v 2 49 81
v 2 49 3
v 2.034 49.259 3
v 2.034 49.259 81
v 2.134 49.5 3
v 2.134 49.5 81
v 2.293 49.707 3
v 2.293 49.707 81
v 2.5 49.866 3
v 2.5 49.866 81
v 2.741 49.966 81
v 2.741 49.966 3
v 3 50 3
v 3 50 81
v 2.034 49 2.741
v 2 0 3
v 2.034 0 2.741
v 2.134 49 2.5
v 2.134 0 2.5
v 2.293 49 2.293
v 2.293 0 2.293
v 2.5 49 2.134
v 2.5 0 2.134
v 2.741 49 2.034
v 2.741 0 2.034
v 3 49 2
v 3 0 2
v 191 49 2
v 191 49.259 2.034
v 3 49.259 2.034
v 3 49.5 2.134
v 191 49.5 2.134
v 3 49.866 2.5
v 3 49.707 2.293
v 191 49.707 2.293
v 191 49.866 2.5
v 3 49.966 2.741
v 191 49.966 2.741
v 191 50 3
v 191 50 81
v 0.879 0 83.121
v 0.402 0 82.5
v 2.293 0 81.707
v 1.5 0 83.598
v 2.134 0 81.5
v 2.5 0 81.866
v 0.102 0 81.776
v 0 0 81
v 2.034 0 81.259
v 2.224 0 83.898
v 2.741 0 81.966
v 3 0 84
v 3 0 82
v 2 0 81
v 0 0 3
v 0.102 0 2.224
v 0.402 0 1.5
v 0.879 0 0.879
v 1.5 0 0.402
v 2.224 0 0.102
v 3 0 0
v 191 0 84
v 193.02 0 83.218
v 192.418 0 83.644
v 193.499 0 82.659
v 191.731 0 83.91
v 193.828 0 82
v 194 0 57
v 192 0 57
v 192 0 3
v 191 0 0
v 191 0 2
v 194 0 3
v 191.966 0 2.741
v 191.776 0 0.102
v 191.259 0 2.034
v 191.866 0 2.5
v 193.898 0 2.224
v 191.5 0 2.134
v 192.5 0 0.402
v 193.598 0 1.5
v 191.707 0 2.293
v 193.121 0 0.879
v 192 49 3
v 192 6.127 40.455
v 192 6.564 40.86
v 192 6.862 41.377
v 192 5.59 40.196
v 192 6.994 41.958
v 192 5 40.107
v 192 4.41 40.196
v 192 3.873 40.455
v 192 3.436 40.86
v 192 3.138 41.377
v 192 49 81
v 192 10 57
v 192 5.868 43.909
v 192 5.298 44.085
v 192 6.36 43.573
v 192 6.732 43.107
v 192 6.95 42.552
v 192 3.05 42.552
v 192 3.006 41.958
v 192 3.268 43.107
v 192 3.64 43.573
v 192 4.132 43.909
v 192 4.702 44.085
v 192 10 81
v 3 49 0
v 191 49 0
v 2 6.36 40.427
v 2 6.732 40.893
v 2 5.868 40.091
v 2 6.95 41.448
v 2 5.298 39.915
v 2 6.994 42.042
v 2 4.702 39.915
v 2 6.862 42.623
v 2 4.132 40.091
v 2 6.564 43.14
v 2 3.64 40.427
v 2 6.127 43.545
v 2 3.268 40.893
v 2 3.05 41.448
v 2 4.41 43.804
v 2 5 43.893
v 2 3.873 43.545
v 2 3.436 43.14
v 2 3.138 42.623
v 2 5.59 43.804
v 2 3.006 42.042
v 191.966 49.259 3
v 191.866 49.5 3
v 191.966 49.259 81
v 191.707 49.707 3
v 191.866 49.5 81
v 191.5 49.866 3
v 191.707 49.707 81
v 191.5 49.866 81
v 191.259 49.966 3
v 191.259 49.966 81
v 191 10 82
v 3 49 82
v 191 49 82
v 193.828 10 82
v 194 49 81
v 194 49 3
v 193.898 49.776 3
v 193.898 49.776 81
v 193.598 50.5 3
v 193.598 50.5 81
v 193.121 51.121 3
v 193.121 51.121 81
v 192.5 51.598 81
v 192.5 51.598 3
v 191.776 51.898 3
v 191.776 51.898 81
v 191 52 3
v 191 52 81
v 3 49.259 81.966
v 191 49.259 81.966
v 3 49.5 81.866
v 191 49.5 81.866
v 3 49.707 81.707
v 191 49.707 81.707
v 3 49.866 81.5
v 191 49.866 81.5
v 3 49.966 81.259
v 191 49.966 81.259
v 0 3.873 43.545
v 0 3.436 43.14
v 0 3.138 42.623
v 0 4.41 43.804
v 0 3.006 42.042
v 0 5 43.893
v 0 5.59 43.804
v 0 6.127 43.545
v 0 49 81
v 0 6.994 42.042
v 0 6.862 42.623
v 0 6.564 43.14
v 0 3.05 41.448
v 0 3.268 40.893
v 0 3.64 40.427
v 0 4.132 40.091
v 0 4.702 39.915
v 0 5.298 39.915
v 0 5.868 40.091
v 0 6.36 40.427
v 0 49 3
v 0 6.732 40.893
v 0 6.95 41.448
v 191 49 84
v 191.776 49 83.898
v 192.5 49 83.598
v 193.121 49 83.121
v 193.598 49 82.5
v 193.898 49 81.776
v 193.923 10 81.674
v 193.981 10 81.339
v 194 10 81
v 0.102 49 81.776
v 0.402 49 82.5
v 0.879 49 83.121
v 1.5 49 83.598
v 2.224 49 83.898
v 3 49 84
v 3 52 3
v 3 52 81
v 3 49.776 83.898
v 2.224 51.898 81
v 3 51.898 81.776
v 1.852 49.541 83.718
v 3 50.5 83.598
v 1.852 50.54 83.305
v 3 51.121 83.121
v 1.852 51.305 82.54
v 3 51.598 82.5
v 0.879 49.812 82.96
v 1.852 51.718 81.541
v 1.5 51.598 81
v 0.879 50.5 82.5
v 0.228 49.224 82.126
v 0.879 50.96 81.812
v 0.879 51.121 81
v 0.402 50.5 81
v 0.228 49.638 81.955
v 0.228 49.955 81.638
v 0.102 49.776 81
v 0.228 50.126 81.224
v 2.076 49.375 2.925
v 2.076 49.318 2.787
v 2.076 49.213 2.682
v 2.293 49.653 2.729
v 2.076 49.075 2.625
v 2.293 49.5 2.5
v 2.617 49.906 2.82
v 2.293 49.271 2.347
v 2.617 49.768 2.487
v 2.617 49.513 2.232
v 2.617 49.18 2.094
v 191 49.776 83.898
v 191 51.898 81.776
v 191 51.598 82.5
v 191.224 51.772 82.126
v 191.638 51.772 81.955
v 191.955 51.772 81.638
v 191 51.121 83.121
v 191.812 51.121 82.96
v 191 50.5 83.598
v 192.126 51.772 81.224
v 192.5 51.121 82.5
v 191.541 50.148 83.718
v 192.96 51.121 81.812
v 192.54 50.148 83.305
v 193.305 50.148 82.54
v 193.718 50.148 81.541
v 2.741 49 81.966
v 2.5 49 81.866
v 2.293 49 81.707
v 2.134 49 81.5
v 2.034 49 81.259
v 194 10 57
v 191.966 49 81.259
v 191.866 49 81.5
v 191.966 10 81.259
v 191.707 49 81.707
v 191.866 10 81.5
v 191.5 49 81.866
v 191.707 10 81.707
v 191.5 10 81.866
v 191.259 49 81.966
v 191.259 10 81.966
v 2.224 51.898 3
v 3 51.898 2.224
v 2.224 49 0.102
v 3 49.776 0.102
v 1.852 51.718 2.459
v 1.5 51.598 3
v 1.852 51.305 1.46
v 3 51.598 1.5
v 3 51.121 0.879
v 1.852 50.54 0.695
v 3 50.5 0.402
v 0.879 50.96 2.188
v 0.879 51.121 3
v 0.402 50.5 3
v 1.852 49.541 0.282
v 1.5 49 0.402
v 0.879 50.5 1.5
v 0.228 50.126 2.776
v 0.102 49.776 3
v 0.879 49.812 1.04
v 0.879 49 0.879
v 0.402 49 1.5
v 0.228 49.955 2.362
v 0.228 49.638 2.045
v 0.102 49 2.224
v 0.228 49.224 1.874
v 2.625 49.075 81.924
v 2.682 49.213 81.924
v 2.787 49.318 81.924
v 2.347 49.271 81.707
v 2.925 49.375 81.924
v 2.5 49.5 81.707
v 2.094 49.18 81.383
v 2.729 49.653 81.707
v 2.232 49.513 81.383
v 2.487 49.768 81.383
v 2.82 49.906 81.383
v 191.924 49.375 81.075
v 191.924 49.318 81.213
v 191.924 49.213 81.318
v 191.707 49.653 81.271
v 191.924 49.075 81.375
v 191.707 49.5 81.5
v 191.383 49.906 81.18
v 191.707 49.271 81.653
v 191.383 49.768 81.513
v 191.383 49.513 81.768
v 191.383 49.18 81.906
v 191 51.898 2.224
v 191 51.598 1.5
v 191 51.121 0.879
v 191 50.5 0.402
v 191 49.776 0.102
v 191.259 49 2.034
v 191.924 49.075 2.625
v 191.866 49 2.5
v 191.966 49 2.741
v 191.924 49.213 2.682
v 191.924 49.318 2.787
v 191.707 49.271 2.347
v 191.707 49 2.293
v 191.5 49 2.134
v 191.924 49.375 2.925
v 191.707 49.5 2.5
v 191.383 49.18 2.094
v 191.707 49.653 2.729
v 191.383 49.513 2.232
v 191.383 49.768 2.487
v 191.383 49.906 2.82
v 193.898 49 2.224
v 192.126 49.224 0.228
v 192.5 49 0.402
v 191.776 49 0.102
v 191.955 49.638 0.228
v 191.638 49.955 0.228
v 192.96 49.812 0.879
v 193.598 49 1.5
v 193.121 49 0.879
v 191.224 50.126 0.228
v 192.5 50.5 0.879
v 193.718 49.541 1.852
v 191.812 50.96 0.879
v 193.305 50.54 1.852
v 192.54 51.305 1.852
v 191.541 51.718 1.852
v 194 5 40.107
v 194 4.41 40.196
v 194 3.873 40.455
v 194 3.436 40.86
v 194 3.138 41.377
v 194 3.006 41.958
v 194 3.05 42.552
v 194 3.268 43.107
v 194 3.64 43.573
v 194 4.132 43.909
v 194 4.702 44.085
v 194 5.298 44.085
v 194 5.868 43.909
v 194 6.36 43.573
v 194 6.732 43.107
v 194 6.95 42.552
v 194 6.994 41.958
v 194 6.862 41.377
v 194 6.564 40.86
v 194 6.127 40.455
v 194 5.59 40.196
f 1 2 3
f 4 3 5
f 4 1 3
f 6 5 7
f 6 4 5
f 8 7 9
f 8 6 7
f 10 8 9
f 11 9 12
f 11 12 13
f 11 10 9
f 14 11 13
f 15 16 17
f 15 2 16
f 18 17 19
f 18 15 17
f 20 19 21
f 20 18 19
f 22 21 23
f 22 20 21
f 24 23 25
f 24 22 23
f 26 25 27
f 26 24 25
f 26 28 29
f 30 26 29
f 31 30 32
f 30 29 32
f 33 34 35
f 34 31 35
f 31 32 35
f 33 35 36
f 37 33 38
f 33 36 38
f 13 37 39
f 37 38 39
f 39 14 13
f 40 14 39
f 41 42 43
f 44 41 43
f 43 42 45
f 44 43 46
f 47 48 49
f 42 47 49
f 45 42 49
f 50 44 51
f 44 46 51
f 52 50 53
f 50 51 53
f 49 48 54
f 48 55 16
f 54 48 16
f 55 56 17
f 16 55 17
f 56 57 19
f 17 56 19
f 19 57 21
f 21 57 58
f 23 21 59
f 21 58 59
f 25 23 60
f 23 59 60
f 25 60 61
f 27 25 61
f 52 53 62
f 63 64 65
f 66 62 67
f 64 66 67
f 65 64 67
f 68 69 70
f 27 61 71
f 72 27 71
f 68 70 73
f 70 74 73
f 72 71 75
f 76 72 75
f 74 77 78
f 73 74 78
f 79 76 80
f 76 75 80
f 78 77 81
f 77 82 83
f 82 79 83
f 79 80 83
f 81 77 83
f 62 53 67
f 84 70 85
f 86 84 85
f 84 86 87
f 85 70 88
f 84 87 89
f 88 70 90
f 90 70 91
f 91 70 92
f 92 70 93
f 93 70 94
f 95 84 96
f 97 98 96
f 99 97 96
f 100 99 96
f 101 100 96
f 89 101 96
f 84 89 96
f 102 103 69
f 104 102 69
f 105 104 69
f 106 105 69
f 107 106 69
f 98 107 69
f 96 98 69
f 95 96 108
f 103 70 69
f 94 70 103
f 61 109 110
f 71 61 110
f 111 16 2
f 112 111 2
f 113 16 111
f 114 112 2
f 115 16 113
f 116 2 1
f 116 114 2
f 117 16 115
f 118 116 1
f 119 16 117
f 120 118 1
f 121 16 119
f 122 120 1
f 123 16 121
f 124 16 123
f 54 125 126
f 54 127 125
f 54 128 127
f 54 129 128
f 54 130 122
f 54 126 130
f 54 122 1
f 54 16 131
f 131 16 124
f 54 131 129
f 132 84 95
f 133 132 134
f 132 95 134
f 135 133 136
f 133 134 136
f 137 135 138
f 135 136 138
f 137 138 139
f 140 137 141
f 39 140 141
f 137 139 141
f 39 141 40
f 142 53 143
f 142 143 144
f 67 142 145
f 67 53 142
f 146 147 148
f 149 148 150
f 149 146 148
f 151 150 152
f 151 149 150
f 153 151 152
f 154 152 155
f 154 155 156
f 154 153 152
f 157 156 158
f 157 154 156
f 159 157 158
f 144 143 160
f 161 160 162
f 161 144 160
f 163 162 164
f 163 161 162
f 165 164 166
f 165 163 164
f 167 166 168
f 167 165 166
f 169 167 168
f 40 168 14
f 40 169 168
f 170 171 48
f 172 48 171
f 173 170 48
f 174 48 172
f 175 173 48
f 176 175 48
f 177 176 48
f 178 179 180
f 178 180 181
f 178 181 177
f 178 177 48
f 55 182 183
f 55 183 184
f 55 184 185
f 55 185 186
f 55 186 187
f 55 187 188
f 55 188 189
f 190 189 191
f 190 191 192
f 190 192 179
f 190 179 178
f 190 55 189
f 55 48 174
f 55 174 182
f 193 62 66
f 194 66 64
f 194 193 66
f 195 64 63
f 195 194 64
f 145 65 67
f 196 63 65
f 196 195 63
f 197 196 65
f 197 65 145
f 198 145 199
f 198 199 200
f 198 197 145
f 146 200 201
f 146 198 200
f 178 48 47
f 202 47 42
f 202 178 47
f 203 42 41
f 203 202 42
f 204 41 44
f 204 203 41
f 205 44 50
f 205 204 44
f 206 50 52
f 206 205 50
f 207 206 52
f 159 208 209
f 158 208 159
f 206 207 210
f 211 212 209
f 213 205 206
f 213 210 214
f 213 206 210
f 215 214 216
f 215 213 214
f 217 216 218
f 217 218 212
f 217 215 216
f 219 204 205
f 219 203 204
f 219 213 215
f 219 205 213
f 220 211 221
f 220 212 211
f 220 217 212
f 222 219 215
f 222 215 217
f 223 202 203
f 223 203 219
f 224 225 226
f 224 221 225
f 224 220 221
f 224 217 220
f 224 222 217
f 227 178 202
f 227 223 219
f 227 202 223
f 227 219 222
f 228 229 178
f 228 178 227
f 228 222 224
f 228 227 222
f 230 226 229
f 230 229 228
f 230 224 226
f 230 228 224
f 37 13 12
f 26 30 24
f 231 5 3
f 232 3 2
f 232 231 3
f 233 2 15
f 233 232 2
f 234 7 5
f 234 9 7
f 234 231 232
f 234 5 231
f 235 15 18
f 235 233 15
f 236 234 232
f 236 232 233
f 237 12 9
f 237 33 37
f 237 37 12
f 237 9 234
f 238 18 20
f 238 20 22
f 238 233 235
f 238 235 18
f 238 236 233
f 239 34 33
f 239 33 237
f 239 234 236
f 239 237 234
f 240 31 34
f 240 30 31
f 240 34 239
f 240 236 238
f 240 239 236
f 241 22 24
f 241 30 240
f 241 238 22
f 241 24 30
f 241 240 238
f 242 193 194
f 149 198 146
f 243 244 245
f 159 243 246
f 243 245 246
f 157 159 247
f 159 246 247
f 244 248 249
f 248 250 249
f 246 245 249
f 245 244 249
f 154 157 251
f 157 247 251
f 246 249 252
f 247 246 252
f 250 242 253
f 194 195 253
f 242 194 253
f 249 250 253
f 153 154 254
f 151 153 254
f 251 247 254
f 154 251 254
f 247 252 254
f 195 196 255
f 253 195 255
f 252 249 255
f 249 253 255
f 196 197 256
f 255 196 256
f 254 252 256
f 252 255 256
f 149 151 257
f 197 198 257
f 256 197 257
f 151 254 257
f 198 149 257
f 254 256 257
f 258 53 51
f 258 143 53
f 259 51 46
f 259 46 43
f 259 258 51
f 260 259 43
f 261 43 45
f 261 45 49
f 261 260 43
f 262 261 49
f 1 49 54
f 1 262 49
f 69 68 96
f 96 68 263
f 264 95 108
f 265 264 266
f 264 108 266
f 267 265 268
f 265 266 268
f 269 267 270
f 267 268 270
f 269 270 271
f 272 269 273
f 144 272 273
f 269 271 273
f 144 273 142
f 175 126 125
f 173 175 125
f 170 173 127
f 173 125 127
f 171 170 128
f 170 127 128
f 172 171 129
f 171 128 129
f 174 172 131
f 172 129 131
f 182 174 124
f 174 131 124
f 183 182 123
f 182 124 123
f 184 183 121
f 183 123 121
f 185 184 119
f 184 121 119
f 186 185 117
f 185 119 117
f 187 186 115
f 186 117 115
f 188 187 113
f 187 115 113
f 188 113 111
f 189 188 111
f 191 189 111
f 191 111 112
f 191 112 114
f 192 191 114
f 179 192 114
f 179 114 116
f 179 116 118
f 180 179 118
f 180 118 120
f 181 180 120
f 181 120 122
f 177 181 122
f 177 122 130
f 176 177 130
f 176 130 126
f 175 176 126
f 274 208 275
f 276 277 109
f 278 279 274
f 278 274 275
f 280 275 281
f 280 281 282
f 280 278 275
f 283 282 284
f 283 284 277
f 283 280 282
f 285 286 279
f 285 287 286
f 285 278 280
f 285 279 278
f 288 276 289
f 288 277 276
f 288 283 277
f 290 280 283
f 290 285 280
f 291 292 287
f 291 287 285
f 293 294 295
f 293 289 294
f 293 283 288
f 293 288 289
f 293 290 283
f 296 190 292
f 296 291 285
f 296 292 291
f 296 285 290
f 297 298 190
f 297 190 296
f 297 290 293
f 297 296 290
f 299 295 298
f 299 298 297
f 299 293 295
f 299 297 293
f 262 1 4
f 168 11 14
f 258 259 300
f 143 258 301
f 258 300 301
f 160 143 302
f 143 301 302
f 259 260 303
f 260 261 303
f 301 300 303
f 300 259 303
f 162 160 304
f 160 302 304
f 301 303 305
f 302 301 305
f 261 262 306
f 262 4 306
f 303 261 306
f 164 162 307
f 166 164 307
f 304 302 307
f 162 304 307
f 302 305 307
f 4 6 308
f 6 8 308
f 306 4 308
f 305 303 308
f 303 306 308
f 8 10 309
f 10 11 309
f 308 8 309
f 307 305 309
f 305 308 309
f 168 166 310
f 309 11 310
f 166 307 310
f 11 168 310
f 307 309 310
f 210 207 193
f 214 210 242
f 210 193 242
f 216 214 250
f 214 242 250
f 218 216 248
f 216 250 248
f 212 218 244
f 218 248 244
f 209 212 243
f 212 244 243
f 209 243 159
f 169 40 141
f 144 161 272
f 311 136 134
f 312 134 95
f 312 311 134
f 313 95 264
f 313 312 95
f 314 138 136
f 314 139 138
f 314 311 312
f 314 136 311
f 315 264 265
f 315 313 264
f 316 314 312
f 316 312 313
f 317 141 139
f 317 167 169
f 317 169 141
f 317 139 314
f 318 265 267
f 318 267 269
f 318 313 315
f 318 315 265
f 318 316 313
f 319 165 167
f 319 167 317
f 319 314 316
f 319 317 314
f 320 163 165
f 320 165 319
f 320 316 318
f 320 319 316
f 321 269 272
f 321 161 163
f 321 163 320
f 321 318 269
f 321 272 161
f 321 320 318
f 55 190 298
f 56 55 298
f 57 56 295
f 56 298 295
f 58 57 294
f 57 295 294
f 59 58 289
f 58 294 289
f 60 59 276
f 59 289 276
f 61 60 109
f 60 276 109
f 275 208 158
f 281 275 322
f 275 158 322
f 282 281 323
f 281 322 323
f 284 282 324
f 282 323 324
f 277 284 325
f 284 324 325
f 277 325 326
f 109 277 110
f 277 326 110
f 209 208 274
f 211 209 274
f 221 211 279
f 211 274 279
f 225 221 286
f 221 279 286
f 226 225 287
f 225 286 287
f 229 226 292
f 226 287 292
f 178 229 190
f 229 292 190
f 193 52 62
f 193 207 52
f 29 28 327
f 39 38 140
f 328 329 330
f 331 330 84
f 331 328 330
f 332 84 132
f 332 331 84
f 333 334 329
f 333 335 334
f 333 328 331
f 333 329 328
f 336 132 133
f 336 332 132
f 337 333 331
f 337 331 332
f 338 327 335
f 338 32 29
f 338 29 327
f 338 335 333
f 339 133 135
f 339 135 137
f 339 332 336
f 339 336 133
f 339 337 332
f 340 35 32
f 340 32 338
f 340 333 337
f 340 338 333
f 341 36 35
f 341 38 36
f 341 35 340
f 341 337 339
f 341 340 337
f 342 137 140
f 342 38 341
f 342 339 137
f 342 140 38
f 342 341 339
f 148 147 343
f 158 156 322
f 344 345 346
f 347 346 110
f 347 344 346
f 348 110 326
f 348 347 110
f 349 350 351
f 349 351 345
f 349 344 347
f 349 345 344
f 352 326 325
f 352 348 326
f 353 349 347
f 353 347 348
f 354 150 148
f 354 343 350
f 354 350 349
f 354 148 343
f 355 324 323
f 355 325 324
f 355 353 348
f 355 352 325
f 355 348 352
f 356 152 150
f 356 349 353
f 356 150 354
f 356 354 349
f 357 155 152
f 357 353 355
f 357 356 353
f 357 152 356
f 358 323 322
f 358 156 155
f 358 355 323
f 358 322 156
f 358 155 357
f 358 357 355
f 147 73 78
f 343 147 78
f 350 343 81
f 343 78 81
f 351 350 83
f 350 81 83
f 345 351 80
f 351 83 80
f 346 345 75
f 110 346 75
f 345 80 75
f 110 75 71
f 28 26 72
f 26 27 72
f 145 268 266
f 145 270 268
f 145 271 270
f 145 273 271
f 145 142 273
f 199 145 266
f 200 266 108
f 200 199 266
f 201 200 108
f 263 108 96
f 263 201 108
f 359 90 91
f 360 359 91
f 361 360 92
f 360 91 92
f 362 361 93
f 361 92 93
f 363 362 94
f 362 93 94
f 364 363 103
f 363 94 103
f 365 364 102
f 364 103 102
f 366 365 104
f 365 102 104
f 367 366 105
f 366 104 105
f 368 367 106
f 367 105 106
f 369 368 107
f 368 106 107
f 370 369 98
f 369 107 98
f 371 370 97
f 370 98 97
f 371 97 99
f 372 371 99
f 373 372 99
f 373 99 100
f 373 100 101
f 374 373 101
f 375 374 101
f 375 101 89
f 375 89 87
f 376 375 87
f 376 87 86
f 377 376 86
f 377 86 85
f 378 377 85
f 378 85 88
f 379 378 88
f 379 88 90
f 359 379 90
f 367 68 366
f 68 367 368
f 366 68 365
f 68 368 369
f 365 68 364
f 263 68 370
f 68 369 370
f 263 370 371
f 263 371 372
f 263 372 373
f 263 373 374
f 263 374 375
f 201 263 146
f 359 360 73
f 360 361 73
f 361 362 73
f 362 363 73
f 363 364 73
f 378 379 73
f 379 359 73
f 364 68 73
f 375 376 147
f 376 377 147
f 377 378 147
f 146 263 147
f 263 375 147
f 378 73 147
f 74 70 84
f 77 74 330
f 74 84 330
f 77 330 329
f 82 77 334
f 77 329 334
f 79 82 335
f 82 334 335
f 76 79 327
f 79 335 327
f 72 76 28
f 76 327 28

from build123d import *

# Parameters (mm, degrees)
SKETCH1_W                 = 194
SKETCH1_H                 = 52
BOSS_EXTRUDE1_DEPTH       = 84
SKETCH2_W                 = 190
SKETCH2_H                 = 80
CUT_EXTRUDE1_DEPTH        = 50
FILLET1_R                 = 1
FILLET2_R                 = 1
FILLET3_R                 = 1
FILLET4_R                 = 3
FILLET5_R                 = 3
SKETCH3_W                 = 25
SKETCH3_H                 = 10
CUT_EXTRUDE2_DEPTH        = 5
F_4_0MM_DOWEL_HOLE1_D     = 4
F_4_0MM_DOWEL_HOLE1_DEPTH = 20
F_4_0MM_DOWEL_HOLE1_TIP   = 1.201721238
F_4_0MM_DOWEL_HOLE2_D     = 4
F_4_0MM_DOWEL_HOLE2_DEPTH = 20
F_4_0MM_DOWEL_HOLE2_TIP   = 1.201721238


with BuildPart() as part:
    # Sketch1 → Boss-Extrude1 (new body)
    with BuildSketch(Plane.XY):
        with Locations((97, 26)):
            Rectangle(SKETCH1_W, SKETCH1_H)
    extrude(amount=BOSS_EXTRUDE1_DEPTH)

    # Sketch2 → Cut-Extrude1 (cut)
    with BuildSketch(Plane.XZ):
        with Locations((97, 42)):
            Rectangle(SKETCH2_W, SKETCH2_H)
    extrude(amount=-CUT_EXTRUDE1_DEPTH, mode=Mode.SUBTRACT)

    # Fillet1
    fillet1_edges = [part.edges().sort_by_distance(p)[0] for p in [
        (97, 50, 2),
        (2, 50, 42),
        (2, 25, 2),
    ]]
    fillet(fillet1_edges, radius=FILLET1_R)

    # Fillet2
    fillet2_edges = [part.edges().sort_by_distance(p)[0] for p in [
        (97.5, 50, 82),
        (2, 24.5, 82),
        (2.292893219, 49.707106781, 82),
    ]]
    fillet(fillet2_edges, radius=FILLET2_R)

    # Fillet3
    fillet3_edges = [part.edges().sort_by_distance(p)[0] for p in [
        (192, 50, 42),
        (192, 24.5, 2),
        (192, 49.707106781, 2.292893219),
        (192, 24.5, 82),
        (192, 49.707106781, 81.707106781),
    ]]
    fillet(fillet3_edges, radius=FILLET3_R)

    # Fillet4
    fillet4_edges = [part.edges().sort_by_distance(p)[0] for p in [
        (194, 26, 84),
        (97, 52, 84),
        (0, 26, 84),
        (194, 52, 42),
    ]]
    fillet(fillet4_edges, radius=FILLET4_R)

    # Fillet5
    # the kernel refuses this fillet: 3 mm, written as the material it takes off along each edge
    with BuildSketch(Plane(origin=(3, 49, 81), x_dir=(0, 1, 0), z_dir=(-1, 0, 0))) as fillet5_piece_1_section:
        Polygon((0, 0), (FILLET5_R, 0), (FILLET5_R, -FILLET5_R), (0, -FILLET5_R), align=None)
    fillet5_piece_1 = extrude(amount=FILLET5_R, mode=Mode.PRIVATE)
    fillet5_piece_1 = fillet5_piece_1 - Plane(origin=(3, 49, 81), x_dir=(0, -0.7071067811865475, -0.7071067811865475), z_dir=(-1, 0, 0)) * Sphere(FILLET5_R, mode=Mode.PRIVATE)
    add(fillet5_piece_1, mode=Mode.SUBTRACT)
    with BuildSketch(Plane(origin=(3, 49, 3), x_dir=(0, 0, -1), z_dir=(-1, 0, 0))) as fillet5_piece_2_section:
        Polygon((0, 0), (FILLET5_R, 0), (FILLET5_R, -FILLET5_R), (0, -FILLET5_R), align=None)
    fillet5_piece_2 = extrude(amount=FILLET5_R, mode=Mode.PRIVATE)
    fillet5_piece_2 = fillet5_piece_2 - Plane(origin=(3, 49, 3), x_dir=(0, -0.7071067811865475, 0.7071067811865475), z_dir=(-1, 0, 0)) * Sphere(FILLET5_R, mode=Mode.PRIVATE)
    add(fillet5_piece_2, mode=Mode.SUBTRACT)
    with BuildSketch(Plane(origin=(194, -7.5, 0), x_dir=(-1, 0, 0), z_dir=(0, 1, 0))) as fillet5_piece_3:
        with BuildLine():
            CenterArc((FILLET5_R, FILLET5_R), FILLET5_R, 180, 90)
            Line((0, FILLET5_R), (0, 0))
            Line((0, 0), (FILLET5_R, 0))
        make_face()
    extrude(amount=56.5, mode=Mode.SUBTRACT)
    with BuildSketch(Plane(origin=(0, 49, 0), x_dir=(0, 0, 1), z_dir=(0, -1, 0))) as fillet5_piece_4:
        with BuildLine():
            CenterArc((FILLET5_R, -FILLET5_R), FILLET5_R, 90, 90)
            Line((0, -FILLET5_R), (0, 0))
            Line((0, 0), (FILLET5_R, 0))
        make_face()
    extrude(amount=56.5, mode=Mode.SUBTRACT)
    with BuildSketch(Plane(origin=(191, 52, 0), x_dir=(0, -1, 0), z_dir=(-1, 0, 0))) as fillet5_piece_5:
        with BuildLine():
            CenterArc((FILLET5_R, FILLET5_R), FILLET5_R, 180, 90)
            Line((0, FILLET5_R), (0, 0))
            Line((0, 0), (FILLET5_R, 0))
        make_face()
    extrude(amount=188, mode=Mode.SUBTRACT)
    with BuildSketch(Plane(origin=(0, 52, 3), x_dir=(0, -1, 0), z_dir=(0, 0, 1))) as fillet5_piece_6:
        with BuildLine():
            CenterArc((FILLET5_R, FILLET5_R), FILLET5_R, 180, 90)
            Line((0, FILLET5_R), (0, 0))
            Line((0, 0), (FILLET5_R, 0))
        make_face()
    extrude(amount=78, mode=Mode.SUBTRACT)
    with BuildSketch(Plane(origin=(191, 49, 0), x_dir=(1, 0, 0), z_dir=(0, -1, 0))) as fillet5_piece_7:
        with BuildLine():
            CenterArc((3 - FILLET5_R, FILLET5_R), FILLET5_R, 270, 90)
            Line((3, FILLET5_R), (3, 0))
            Line((3, 0), (3 - FILLET5_R, 0))
        make_face()
    revolve(axis=Axis((191, 49, 0), (0, 0, 1)), revolution_arc=90, mode=Mode.SUBTRACT)

    # Sketch3 → Cut-Extrude2 (cut)
    with BuildSketch(Plane(origin=(194, 0, 0), x_dir=(0, 0, -1), z_dir=(1, 0, 0))):
        with Locations((-69.5, 5)):
            Rectangle(SKETCH3_W, SKETCH3_H)
    extrude(amount=-CUT_EXTRUDE2_DEPTH, mode=Mode.SUBTRACT)

    # Ø4.0mm Dowel Hole1
    with Locations(Plane(origin=(194, 5, 42.107279869), x_dir=(0, 0, 1), z_dir=(1, 0, 0))):
        with Locations((0, 0)):
            Hole(F_4_0MM_DOWEL_HOLE1_D / 2, depth=F_4_0MM_DOWEL_HOLE1_DEPTH)
            with Locations((0, 0, -(F_4_0MM_DOWEL_HOLE1_DEPTH + F_4_0MM_DOWEL_HOLE1_TIP / 2))):  # 118° drill point
                Cone(0, F_4_0MM_DOWEL_HOLE1_D / 2, F_4_0MM_DOWEL_HOLE1_TIP, mode=Mode.SUBTRACT)

    # Ø4.0mm Dowel Hole2
    with Locations(Plane(origin=(0, 5, 41.892720131), x_dir=(0, 0, -1), z_dir=(-1, 0, 0))):
        with Locations((0, 0)):
            Hole(F_4_0MM_DOWEL_HOLE2_D / 2, depth=F_4_0MM_DOWEL_HOLE2_DEPTH)
            with Locations((0, 0, -(F_4_0MM_DOWEL_HOLE2_DEPTH + F_4_0MM_DOWEL_HOLE2_TIP / 2))):  # 118° drill point
                Cone(0, F_4_0MM_DOWEL_HOLE2_D / 2, F_4_0MM_DOWEL_HOLE2_TIP, mode=Mode.SUBTRACT)


solid = part.part
